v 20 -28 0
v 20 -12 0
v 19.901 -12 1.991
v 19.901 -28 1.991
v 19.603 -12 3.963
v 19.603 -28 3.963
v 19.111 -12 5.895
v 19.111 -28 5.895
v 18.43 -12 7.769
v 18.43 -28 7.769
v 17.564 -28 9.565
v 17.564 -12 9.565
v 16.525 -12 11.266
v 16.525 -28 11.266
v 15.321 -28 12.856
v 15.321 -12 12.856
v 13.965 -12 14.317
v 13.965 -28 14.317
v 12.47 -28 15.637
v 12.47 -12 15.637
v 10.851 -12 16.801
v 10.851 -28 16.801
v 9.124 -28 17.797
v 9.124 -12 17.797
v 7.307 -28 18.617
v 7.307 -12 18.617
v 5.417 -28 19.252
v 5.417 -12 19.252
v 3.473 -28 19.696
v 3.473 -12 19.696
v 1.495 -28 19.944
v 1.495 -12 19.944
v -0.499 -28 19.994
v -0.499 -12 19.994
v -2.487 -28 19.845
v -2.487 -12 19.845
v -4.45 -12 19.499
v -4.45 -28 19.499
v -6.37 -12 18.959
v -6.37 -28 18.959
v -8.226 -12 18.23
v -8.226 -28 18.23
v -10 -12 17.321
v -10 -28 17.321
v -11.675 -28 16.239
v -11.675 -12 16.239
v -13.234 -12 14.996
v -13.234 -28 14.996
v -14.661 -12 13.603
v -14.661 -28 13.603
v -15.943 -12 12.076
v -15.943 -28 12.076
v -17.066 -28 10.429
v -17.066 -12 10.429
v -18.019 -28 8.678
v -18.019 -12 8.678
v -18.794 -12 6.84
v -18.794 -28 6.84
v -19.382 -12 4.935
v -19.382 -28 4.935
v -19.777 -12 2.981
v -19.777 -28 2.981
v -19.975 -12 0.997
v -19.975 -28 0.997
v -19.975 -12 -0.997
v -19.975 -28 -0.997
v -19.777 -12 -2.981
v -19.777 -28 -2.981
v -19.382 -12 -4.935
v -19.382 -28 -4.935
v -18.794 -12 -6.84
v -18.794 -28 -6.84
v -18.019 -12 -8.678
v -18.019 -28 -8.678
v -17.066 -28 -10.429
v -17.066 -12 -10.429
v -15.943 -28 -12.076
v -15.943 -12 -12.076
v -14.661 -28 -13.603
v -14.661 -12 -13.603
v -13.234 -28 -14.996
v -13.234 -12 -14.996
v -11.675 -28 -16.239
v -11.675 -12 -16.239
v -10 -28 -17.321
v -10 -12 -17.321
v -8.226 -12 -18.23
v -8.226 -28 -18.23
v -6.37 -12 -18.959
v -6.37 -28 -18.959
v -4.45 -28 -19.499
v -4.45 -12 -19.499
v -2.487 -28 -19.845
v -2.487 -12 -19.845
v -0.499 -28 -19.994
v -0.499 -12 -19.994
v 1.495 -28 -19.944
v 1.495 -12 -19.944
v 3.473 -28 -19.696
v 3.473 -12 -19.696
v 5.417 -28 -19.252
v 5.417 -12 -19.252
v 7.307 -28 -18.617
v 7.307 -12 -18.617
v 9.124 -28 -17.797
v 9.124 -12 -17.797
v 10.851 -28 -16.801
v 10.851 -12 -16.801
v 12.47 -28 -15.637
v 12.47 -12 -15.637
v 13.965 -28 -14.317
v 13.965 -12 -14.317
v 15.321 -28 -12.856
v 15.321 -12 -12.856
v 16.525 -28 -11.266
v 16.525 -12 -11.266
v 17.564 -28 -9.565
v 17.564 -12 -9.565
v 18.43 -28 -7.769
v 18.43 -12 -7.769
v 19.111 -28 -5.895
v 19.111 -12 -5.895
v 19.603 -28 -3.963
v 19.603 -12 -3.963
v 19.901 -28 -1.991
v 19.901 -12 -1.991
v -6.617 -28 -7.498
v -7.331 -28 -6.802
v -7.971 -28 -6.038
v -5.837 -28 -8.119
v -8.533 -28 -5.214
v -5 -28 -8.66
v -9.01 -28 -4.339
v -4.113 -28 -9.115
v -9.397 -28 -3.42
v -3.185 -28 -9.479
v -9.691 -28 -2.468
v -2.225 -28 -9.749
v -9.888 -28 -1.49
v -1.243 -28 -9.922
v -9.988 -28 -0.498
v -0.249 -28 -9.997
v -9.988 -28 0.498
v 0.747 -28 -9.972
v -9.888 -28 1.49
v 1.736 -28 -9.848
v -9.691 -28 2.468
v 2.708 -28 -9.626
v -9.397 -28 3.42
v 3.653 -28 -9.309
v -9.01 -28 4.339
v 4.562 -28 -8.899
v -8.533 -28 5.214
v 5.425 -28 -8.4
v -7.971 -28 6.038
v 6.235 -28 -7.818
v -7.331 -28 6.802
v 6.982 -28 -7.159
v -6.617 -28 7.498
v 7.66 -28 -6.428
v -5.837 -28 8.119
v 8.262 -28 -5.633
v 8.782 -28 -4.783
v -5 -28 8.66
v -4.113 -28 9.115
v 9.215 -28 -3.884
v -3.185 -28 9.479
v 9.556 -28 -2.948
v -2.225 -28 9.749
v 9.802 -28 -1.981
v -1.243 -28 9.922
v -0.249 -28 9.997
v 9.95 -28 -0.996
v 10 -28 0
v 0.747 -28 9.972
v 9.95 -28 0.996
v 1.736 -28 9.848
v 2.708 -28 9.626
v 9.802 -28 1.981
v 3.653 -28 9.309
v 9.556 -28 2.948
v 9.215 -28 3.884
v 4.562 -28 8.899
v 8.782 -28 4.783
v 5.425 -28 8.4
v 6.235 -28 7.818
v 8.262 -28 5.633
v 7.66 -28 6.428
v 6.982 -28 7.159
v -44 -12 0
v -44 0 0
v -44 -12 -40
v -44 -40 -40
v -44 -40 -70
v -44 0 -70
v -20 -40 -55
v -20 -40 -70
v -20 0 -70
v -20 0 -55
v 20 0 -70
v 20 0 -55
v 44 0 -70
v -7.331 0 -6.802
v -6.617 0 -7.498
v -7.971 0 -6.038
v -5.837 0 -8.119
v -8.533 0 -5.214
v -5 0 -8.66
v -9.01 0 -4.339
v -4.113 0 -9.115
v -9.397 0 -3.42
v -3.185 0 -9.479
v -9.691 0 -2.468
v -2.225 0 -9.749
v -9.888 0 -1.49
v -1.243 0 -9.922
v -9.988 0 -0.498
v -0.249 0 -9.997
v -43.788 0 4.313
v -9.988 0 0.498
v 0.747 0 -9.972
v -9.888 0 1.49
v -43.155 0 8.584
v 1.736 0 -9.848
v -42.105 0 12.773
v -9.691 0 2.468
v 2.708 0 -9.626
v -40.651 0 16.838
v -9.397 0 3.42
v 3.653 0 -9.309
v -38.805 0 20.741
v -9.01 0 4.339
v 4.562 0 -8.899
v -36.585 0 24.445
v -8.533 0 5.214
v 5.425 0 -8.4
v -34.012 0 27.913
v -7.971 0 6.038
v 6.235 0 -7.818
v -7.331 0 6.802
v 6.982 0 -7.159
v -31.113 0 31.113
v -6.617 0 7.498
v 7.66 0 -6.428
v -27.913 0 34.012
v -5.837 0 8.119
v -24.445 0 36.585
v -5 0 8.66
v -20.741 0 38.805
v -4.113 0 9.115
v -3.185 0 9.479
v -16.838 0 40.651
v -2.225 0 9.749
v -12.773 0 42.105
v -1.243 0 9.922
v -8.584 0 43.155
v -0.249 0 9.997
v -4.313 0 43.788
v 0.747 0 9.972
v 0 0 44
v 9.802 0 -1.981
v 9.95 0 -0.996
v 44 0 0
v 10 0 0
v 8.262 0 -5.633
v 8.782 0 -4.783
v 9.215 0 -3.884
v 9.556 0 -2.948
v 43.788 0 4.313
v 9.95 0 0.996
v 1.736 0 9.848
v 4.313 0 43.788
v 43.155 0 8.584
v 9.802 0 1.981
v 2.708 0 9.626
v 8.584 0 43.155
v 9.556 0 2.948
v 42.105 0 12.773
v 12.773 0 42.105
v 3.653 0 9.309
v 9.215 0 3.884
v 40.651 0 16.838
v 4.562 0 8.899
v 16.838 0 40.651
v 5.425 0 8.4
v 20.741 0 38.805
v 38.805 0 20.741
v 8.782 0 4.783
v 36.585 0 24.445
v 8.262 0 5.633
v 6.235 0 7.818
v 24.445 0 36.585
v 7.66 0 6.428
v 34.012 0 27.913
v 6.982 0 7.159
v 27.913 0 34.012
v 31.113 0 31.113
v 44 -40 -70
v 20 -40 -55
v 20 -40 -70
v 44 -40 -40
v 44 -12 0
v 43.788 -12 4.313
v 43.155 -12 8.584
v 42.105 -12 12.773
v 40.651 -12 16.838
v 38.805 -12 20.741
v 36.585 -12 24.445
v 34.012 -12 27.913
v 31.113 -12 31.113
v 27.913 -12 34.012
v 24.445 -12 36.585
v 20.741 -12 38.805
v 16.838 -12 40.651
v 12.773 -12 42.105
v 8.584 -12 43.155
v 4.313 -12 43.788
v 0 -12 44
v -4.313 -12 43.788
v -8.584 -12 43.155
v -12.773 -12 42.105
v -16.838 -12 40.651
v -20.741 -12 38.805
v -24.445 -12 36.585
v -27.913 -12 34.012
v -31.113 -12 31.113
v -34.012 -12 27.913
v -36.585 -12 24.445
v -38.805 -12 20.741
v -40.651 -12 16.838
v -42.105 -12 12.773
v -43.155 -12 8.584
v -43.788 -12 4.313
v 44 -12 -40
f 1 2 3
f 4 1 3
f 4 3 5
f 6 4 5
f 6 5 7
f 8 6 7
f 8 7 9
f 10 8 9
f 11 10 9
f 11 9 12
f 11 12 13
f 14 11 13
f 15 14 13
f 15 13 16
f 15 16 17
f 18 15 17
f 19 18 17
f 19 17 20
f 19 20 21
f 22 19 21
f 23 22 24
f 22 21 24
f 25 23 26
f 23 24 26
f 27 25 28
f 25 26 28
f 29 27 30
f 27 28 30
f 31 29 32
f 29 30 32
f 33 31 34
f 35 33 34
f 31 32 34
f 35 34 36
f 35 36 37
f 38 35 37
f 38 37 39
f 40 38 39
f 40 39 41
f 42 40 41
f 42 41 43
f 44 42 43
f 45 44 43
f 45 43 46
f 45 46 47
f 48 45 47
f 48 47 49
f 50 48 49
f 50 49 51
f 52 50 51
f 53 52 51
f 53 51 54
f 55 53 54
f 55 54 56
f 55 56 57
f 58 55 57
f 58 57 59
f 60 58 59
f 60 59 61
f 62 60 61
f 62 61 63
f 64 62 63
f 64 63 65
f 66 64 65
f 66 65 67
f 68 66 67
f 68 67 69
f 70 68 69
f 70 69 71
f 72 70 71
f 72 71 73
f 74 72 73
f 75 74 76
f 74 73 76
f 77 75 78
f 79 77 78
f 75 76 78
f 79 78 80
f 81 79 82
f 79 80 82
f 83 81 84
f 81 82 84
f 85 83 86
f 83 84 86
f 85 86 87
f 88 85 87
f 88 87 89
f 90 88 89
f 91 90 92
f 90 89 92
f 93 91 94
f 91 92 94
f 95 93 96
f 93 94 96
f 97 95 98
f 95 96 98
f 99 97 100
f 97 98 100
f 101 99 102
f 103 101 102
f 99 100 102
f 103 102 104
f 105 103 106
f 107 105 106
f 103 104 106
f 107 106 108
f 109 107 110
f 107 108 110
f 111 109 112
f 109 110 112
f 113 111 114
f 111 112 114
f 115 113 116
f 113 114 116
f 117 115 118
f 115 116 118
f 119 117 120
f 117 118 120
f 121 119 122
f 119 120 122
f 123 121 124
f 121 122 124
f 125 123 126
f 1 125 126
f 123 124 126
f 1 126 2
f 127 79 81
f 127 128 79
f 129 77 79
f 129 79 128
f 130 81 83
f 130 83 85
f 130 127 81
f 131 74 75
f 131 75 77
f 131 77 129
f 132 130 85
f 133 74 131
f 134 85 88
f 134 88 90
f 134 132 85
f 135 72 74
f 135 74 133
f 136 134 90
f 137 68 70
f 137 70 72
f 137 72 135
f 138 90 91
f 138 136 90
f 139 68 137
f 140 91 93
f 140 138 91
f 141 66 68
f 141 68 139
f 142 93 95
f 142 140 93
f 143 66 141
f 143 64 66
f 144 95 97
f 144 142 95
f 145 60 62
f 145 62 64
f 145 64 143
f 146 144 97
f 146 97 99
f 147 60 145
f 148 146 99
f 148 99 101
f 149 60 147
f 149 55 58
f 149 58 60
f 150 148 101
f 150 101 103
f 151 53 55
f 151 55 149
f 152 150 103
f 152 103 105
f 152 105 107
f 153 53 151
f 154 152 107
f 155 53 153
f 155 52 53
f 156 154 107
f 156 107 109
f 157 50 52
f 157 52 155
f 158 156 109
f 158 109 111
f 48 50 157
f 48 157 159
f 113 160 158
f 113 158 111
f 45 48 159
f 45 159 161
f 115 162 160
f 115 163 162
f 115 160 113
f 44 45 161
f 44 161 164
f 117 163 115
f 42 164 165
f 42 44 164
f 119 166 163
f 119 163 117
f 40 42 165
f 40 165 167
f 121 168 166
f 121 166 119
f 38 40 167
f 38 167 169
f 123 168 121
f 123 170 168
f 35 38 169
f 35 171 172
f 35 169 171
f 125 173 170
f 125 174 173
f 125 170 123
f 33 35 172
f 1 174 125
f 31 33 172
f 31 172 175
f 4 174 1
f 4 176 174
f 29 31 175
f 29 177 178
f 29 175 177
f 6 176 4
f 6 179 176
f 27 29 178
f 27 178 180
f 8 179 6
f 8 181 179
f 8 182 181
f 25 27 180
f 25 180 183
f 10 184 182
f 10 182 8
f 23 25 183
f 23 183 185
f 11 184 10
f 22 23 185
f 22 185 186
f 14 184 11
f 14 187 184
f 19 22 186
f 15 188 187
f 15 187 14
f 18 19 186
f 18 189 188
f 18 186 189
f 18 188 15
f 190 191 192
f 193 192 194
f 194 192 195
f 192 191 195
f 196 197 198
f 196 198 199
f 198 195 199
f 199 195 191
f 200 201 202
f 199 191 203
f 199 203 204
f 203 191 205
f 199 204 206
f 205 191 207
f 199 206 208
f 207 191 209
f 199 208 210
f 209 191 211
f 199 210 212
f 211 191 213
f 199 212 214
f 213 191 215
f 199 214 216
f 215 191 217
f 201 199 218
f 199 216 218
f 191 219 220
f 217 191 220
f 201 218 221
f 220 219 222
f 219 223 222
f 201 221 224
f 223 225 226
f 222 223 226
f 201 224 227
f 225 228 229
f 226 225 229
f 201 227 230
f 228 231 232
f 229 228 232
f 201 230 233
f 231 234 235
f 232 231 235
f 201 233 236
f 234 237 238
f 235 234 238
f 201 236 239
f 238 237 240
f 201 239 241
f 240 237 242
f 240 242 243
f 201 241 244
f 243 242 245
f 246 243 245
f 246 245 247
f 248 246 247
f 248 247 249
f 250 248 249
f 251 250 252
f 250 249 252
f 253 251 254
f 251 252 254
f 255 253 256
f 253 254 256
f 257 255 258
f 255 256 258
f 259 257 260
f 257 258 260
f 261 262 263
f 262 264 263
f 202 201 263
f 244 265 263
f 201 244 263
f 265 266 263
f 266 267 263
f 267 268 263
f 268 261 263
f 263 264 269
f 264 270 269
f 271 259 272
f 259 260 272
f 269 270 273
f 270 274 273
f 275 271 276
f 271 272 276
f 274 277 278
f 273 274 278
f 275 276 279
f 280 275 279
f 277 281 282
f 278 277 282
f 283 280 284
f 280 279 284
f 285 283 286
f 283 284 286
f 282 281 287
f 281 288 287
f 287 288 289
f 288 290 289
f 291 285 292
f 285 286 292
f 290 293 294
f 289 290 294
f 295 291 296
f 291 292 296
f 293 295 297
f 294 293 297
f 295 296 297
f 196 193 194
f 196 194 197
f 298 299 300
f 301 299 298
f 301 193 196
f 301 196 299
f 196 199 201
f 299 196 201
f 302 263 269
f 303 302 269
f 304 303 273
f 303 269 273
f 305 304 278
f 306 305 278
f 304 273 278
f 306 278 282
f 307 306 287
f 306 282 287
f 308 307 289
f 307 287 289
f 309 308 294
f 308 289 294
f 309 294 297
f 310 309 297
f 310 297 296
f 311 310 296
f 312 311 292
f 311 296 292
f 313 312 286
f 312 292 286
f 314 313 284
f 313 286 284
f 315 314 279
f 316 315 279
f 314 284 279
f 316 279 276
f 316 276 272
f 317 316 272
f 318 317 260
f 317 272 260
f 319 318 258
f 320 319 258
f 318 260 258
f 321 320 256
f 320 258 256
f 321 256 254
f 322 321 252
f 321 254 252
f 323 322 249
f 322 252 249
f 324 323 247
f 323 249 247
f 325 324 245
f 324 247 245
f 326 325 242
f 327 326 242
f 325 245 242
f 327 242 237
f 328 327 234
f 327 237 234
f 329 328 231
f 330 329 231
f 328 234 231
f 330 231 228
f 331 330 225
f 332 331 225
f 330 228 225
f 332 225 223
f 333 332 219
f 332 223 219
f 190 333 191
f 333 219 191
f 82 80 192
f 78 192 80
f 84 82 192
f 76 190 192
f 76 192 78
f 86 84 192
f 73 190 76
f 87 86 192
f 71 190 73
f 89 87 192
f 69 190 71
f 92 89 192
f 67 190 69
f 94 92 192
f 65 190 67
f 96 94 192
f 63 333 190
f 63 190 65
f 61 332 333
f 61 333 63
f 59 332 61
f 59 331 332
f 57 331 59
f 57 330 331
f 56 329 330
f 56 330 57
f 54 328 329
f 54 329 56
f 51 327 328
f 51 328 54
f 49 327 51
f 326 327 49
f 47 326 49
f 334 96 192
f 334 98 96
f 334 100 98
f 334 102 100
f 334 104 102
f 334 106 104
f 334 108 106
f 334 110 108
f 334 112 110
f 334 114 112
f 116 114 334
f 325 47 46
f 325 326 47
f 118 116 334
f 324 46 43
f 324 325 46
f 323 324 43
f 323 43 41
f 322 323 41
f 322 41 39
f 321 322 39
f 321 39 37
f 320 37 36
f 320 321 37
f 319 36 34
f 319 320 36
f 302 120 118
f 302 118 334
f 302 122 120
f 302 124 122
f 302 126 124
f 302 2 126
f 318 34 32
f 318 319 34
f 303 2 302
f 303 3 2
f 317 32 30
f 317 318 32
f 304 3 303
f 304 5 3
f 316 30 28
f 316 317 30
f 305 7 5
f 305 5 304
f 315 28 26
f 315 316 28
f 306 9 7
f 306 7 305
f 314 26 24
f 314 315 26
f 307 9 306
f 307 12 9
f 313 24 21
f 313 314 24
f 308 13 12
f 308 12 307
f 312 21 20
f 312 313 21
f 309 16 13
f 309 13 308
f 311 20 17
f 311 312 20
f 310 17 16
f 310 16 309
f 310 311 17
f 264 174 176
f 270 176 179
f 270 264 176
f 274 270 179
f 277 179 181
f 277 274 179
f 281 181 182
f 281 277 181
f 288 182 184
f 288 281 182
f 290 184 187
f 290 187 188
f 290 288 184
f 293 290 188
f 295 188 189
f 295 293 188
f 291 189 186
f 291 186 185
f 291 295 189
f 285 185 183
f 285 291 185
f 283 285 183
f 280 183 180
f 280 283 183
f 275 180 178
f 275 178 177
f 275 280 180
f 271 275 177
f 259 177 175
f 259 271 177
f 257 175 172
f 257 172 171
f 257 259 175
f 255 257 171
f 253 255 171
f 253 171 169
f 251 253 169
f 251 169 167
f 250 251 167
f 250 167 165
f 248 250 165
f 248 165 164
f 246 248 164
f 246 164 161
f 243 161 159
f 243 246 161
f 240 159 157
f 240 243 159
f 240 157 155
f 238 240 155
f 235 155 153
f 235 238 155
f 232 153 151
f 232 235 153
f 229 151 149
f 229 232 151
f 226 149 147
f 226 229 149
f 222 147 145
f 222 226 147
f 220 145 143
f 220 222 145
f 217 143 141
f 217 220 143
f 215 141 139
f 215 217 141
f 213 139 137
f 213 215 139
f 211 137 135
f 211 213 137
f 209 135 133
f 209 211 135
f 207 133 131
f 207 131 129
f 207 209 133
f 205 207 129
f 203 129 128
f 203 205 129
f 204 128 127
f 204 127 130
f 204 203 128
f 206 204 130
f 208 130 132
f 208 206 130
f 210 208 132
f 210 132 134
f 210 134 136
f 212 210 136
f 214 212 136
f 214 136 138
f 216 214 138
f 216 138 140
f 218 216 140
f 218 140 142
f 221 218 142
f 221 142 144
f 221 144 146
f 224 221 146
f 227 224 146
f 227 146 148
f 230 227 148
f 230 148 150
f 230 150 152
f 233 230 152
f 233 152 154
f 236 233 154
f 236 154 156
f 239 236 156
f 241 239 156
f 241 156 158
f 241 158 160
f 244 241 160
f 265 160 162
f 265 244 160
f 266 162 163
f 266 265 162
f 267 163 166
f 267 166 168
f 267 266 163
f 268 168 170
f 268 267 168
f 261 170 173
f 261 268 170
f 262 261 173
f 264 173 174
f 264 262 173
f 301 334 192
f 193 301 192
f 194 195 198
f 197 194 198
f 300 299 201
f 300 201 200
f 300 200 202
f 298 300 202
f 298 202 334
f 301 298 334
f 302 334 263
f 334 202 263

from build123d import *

# Parameters (mm, degrees)
F1_DEPTH = 40
F0_R     = 20
F2_DEPTH = 12
F0_R_2   = 10
F3_DEPTH = 28


with BuildPart() as f1:
    # F0 (on Front) → F1 (new body)
    with BuildSketch(Plane.XZ):
        Polygon((-20, -55), (0, -55), (20, -55), (20, -70), (44, -70), (44, -40), (0, -40), (-44, -40), (-44, -70), (-20, -70), align=None)
    extrude(amount=F1_DEPTH)

    # F0 (on Front) → F2 (join)
    with BuildSketch(Plane.XZ):
        Polygon((-20, -55), (0, -55), (20, -55), (20, -70), (44, -70), (44, -40), (0, -40), (-44, -40), (-44, -70), (-20, -70), align=None)
        with BuildLine():
            Line((-44, 0), (-44, -40))
            Line((-44, -40), (0, -40))
            Line((0, -40), (44, -40))
            Line((44, -40), (44, 0))
            ThreePointArc((44, 0), (0, 44), (-44, 0))
        make_face()
        Circle(F0_R, mode=Mode.SUBTRACT)
    extrude(amount=F2_DEPTH)

    # F0 (on Front) → F3 (join)
    with BuildSketch(Plane.XZ):
        Circle(F0_R)
        Circle(F0_R_2, mode=Mode.SUBTRACT)
    extrude(amount=F3_DEPTH)


solid = f1.part
